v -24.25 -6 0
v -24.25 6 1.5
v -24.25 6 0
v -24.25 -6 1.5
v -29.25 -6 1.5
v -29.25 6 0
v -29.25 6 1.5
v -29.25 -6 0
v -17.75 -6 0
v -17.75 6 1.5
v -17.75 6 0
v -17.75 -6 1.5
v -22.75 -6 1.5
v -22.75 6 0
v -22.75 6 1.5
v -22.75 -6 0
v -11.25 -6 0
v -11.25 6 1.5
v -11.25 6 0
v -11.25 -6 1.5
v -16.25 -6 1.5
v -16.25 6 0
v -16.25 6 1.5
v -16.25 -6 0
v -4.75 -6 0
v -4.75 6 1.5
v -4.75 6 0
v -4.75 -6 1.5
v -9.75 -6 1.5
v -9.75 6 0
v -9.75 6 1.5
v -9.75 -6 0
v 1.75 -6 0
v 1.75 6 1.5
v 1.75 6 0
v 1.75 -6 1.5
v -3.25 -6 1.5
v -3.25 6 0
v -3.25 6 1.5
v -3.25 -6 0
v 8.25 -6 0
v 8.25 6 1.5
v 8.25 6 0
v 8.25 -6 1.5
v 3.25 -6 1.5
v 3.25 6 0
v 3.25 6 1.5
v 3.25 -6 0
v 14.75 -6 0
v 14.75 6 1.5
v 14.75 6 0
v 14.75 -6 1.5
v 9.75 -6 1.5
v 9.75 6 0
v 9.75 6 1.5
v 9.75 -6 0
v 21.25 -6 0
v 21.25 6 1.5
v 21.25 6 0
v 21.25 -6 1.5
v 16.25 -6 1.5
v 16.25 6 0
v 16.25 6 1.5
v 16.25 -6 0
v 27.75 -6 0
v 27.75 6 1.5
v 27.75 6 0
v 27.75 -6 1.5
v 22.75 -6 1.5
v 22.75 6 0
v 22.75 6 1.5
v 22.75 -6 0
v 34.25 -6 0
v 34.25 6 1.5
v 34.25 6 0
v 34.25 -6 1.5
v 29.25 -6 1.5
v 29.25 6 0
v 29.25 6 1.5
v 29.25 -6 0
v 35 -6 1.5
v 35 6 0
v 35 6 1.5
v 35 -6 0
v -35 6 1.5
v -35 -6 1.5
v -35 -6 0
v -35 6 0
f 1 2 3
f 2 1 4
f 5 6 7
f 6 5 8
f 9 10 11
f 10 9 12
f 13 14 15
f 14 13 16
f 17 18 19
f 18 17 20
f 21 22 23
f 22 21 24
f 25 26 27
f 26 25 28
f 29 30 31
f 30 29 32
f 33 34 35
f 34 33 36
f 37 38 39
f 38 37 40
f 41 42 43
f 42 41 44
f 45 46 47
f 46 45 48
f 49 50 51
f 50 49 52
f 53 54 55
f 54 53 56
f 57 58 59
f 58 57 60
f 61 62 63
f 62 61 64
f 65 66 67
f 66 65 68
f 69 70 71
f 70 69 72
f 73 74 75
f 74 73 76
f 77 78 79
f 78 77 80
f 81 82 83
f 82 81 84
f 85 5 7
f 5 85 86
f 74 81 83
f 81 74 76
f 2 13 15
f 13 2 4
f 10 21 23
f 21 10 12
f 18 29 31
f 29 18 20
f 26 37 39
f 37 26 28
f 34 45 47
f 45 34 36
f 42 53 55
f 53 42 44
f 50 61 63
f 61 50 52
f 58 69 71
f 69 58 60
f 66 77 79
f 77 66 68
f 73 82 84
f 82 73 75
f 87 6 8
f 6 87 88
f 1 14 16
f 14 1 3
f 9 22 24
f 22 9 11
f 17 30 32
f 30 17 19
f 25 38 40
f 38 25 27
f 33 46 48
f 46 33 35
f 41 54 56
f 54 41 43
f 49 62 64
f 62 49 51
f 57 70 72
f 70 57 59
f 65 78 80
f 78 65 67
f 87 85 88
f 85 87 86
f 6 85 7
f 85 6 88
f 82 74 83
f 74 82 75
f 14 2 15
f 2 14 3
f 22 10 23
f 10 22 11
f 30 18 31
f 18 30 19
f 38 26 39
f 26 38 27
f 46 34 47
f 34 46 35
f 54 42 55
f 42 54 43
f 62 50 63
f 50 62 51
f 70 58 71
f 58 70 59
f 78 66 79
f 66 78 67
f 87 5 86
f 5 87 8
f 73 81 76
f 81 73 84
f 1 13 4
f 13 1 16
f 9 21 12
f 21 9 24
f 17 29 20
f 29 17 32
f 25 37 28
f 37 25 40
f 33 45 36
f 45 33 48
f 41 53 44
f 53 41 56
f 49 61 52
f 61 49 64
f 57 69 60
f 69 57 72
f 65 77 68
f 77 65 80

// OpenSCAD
// Agarose gel casting comb - 10 wells
// Print orientation: flat on bed, teeth pointing down (-Y)

// ---------- Parameters ----------
plate_t      = 1.5;   // plate thickness (Z)
spine_l      = 70;    // spine length (X)
spine_w      = 12;    // spine width (Y)
teeth_n      = 10;    // number of teeth
teeth_w      = 5.0;   // tooth width (X)
teeth_l      = 12;    // tooth length (Y)
teeth_pitch  = teeth_w + 1.5; // centre-to-centre spacing (X)
eps          = 0.5;   // cutter overshoot

$fn = 64;

// ---------- Model ----------
difference() {
    // Plate with spine
    union() {
        translate([-spine_l/2, -spine_w/2, 0])
            cube([spine_l, spine_w, plate_t]);
    }

    // Teeth cutters, centred on spine
    for (i = [0 : teeth_n - 1])
        translate([(i - (teeth_n - 1)/2) * teeth_pitch,
                   -spine_w/2 - eps,
                   -eps])
            cube([teeth_w, teeth_l + 2*eps, plate_t + 2*eps]);
}
